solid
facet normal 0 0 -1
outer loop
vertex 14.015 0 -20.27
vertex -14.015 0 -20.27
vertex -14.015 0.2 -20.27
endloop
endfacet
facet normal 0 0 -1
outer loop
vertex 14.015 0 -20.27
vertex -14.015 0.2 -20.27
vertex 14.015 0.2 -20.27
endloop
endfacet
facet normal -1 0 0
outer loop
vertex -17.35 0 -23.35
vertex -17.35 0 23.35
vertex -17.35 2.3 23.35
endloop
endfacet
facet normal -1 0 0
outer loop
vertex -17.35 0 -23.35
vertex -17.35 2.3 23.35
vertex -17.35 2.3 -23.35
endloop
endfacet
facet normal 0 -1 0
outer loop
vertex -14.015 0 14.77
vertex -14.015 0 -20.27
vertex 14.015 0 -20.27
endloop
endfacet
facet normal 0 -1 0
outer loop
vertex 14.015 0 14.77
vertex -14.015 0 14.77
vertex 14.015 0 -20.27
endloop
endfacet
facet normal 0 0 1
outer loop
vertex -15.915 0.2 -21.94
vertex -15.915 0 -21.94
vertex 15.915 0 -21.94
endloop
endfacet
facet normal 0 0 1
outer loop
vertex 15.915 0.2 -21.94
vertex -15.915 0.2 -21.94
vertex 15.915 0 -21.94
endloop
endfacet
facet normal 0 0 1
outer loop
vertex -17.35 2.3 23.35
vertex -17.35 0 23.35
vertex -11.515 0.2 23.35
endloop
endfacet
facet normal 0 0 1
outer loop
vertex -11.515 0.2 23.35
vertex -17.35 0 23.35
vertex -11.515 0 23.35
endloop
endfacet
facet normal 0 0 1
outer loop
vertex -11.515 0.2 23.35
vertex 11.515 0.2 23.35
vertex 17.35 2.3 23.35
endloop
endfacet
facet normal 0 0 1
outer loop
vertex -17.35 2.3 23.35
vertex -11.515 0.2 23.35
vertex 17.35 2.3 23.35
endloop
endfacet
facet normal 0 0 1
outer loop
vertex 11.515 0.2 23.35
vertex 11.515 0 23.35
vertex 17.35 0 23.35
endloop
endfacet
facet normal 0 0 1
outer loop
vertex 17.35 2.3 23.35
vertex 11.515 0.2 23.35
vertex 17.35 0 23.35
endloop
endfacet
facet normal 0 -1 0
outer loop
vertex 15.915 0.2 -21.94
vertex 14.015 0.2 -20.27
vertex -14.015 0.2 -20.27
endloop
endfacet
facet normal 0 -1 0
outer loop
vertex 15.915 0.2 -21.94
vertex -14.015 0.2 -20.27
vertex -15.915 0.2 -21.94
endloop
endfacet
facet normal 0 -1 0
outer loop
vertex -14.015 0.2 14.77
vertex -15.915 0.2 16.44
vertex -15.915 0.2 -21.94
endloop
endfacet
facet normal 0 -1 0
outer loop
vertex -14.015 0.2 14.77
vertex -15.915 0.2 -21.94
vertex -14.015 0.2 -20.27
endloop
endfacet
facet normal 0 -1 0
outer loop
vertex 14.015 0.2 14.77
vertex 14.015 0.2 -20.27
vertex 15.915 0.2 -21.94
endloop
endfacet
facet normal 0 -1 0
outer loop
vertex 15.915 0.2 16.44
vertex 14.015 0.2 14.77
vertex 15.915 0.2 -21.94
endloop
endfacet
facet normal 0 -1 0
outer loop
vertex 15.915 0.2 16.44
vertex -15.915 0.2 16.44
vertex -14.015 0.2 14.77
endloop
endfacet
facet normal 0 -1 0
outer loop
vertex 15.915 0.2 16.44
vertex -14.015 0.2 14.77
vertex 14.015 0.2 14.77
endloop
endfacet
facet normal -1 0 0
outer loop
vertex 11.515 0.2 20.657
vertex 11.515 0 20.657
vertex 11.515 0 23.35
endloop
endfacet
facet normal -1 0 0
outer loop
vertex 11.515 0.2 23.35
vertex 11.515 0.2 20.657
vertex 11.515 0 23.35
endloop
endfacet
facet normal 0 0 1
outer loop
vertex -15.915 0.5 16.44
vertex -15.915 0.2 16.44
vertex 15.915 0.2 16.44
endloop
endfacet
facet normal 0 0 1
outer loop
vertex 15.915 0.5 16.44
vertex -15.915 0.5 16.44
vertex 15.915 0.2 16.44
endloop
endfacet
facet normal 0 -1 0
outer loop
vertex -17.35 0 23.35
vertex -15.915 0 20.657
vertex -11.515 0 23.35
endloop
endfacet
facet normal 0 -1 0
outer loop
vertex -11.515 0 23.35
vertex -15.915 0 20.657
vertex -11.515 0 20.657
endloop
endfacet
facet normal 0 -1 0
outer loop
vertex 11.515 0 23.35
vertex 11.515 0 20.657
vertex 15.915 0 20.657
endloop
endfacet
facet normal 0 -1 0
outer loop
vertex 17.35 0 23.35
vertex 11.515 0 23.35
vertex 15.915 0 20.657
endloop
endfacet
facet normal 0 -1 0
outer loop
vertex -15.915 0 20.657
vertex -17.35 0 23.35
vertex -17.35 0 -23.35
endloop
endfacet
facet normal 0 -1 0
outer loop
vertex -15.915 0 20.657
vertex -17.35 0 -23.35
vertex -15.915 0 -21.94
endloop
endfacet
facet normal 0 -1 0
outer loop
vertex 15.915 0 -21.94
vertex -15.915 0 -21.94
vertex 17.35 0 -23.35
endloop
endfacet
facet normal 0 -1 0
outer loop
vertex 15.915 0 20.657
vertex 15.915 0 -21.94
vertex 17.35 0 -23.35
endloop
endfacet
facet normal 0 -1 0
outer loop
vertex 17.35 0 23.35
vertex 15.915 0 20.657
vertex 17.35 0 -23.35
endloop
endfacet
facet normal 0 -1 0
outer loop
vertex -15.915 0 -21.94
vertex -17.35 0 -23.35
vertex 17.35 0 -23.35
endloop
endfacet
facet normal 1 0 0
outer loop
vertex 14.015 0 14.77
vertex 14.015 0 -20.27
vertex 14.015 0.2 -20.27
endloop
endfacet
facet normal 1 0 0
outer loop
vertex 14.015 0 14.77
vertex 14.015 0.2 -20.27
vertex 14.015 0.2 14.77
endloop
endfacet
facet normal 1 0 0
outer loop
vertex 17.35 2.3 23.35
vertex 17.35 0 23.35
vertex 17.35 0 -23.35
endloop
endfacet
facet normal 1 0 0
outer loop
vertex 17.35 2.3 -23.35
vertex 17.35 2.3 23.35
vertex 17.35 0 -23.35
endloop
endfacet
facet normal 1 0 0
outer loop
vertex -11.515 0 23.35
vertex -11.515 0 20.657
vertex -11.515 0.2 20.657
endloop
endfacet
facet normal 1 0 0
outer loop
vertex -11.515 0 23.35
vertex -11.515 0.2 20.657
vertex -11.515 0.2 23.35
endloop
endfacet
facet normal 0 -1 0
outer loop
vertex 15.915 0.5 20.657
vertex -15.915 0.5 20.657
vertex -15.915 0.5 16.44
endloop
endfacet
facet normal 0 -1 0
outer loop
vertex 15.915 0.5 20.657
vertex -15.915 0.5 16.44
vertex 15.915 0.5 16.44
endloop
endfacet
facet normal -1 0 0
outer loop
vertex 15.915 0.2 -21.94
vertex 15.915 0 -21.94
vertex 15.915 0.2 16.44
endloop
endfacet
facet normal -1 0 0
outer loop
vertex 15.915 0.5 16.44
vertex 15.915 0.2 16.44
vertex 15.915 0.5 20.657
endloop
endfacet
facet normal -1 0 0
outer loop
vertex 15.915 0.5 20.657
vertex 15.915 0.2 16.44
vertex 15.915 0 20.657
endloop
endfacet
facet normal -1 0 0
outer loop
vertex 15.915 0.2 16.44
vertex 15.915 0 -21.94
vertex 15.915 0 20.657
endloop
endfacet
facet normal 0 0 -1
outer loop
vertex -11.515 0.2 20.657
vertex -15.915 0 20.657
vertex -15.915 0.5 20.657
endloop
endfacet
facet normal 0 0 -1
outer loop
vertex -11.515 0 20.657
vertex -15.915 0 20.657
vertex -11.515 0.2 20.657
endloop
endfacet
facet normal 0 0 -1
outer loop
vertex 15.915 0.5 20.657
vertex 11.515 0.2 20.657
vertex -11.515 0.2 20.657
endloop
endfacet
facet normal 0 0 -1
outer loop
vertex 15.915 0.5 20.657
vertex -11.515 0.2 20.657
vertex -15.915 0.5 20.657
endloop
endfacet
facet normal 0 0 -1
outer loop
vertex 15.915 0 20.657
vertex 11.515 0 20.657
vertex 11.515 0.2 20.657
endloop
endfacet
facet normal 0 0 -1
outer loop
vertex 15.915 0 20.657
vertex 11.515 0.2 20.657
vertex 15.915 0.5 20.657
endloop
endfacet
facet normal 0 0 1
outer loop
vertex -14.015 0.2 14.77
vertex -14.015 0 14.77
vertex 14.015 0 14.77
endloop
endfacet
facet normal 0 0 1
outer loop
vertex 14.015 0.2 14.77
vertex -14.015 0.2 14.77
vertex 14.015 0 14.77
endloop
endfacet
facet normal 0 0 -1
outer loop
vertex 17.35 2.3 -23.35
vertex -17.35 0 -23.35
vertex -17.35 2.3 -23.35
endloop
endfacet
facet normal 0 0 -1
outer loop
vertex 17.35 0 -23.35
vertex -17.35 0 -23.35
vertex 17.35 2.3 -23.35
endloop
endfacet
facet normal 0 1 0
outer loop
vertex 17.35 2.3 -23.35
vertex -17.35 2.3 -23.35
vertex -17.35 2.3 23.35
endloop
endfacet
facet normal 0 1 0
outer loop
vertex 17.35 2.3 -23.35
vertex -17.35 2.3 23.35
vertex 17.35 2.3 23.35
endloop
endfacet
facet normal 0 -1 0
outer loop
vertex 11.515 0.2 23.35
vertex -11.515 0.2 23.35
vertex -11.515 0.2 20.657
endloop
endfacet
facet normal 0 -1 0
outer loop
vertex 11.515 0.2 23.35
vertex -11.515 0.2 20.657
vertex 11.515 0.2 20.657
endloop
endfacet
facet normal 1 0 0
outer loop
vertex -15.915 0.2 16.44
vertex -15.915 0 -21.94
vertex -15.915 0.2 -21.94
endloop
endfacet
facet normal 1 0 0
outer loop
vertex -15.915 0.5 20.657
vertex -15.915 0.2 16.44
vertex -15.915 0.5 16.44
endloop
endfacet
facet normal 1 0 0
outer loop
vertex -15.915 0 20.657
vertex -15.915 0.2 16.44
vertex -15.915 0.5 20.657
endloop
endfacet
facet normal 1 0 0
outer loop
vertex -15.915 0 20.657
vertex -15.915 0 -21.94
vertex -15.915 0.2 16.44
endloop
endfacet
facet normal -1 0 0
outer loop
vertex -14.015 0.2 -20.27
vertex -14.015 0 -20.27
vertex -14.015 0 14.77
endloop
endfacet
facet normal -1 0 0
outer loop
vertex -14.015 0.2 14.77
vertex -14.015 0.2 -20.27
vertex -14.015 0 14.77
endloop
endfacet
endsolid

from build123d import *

# Parameters (mm, degrees)
SKETCH_1_W          = 34.7
SKETCH_1_H          = 46.7
EXTRUDE_1_DEPTH     = 2.3
SKETCH_2_W          = 31.83
SKETCH_2_H          = 38.38
SKETCH_2_W_2        = 28.03
SKETCH_2_H_2        = 35.04
CUT_EXTRUDE_1_DEPTH = 0.2
SKETCH_3_W          = 31.83
SKETCH_3_H          = 4.217139833
CUT_EXTRUDE_2_DEPTH = 0.5
SKETCH_4_W          = 23.03
SKETCH_4_H          = 2.692860167
CUT_EXTRUDE_3_DEPTH = 0.2


with BuildPart() as part:
    # Эскиз1 → Бобышка-Вытянуть1 (new body)
    with BuildSketch(Plane(origin=(0, 0, 0), x_dir=(1, 0, 0), z_dir=(0, 1, 0))):
        Rectangle(SKETCH_1_W, SKETCH_1_H)
    extrude(amount=EXTRUDE_1_DEPTH)

    # Эскиз2 → Вырез-Вытянуть1 (cut)
    with BuildSketch(Plane.XZ):
        with Locations((0, -2.75)):
            Rectangle(SKETCH_2_W, SKETCH_2_H)
        with Locations((0, -2.75)):
            Rectangle(SKETCH_2_W_2, SKETCH_2_H_2, mode=Mode.SUBTRACT)
    extrude(amount=-CUT_EXTRUDE_1_DEPTH, mode=Mode.SUBTRACT)

    # Эскиз3 → Вырез-Вытянуть2 (cut)
    with BuildSketch(Plane.XZ):
        with Locations((0, 18.548569916)):
            Rectangle(SKETCH_3_W, SKETCH_3_H)
    extrude(amount=-CUT_EXTRUDE_2_DEPTH, mode=Mode.SUBTRACT)

    # Эскиз4 → Вырез-Вытянуть3 (cut)
    with BuildSketch(Plane.XZ):
        with Locations((0, 22.003569917)):
            Rectangle(SKETCH_4_W, SKETCH_4_H)
    extrude(amount=-CUT_EXTRUDE_3_DEPTH, mode=Mode.SUBTRACT)


solid = part.part
